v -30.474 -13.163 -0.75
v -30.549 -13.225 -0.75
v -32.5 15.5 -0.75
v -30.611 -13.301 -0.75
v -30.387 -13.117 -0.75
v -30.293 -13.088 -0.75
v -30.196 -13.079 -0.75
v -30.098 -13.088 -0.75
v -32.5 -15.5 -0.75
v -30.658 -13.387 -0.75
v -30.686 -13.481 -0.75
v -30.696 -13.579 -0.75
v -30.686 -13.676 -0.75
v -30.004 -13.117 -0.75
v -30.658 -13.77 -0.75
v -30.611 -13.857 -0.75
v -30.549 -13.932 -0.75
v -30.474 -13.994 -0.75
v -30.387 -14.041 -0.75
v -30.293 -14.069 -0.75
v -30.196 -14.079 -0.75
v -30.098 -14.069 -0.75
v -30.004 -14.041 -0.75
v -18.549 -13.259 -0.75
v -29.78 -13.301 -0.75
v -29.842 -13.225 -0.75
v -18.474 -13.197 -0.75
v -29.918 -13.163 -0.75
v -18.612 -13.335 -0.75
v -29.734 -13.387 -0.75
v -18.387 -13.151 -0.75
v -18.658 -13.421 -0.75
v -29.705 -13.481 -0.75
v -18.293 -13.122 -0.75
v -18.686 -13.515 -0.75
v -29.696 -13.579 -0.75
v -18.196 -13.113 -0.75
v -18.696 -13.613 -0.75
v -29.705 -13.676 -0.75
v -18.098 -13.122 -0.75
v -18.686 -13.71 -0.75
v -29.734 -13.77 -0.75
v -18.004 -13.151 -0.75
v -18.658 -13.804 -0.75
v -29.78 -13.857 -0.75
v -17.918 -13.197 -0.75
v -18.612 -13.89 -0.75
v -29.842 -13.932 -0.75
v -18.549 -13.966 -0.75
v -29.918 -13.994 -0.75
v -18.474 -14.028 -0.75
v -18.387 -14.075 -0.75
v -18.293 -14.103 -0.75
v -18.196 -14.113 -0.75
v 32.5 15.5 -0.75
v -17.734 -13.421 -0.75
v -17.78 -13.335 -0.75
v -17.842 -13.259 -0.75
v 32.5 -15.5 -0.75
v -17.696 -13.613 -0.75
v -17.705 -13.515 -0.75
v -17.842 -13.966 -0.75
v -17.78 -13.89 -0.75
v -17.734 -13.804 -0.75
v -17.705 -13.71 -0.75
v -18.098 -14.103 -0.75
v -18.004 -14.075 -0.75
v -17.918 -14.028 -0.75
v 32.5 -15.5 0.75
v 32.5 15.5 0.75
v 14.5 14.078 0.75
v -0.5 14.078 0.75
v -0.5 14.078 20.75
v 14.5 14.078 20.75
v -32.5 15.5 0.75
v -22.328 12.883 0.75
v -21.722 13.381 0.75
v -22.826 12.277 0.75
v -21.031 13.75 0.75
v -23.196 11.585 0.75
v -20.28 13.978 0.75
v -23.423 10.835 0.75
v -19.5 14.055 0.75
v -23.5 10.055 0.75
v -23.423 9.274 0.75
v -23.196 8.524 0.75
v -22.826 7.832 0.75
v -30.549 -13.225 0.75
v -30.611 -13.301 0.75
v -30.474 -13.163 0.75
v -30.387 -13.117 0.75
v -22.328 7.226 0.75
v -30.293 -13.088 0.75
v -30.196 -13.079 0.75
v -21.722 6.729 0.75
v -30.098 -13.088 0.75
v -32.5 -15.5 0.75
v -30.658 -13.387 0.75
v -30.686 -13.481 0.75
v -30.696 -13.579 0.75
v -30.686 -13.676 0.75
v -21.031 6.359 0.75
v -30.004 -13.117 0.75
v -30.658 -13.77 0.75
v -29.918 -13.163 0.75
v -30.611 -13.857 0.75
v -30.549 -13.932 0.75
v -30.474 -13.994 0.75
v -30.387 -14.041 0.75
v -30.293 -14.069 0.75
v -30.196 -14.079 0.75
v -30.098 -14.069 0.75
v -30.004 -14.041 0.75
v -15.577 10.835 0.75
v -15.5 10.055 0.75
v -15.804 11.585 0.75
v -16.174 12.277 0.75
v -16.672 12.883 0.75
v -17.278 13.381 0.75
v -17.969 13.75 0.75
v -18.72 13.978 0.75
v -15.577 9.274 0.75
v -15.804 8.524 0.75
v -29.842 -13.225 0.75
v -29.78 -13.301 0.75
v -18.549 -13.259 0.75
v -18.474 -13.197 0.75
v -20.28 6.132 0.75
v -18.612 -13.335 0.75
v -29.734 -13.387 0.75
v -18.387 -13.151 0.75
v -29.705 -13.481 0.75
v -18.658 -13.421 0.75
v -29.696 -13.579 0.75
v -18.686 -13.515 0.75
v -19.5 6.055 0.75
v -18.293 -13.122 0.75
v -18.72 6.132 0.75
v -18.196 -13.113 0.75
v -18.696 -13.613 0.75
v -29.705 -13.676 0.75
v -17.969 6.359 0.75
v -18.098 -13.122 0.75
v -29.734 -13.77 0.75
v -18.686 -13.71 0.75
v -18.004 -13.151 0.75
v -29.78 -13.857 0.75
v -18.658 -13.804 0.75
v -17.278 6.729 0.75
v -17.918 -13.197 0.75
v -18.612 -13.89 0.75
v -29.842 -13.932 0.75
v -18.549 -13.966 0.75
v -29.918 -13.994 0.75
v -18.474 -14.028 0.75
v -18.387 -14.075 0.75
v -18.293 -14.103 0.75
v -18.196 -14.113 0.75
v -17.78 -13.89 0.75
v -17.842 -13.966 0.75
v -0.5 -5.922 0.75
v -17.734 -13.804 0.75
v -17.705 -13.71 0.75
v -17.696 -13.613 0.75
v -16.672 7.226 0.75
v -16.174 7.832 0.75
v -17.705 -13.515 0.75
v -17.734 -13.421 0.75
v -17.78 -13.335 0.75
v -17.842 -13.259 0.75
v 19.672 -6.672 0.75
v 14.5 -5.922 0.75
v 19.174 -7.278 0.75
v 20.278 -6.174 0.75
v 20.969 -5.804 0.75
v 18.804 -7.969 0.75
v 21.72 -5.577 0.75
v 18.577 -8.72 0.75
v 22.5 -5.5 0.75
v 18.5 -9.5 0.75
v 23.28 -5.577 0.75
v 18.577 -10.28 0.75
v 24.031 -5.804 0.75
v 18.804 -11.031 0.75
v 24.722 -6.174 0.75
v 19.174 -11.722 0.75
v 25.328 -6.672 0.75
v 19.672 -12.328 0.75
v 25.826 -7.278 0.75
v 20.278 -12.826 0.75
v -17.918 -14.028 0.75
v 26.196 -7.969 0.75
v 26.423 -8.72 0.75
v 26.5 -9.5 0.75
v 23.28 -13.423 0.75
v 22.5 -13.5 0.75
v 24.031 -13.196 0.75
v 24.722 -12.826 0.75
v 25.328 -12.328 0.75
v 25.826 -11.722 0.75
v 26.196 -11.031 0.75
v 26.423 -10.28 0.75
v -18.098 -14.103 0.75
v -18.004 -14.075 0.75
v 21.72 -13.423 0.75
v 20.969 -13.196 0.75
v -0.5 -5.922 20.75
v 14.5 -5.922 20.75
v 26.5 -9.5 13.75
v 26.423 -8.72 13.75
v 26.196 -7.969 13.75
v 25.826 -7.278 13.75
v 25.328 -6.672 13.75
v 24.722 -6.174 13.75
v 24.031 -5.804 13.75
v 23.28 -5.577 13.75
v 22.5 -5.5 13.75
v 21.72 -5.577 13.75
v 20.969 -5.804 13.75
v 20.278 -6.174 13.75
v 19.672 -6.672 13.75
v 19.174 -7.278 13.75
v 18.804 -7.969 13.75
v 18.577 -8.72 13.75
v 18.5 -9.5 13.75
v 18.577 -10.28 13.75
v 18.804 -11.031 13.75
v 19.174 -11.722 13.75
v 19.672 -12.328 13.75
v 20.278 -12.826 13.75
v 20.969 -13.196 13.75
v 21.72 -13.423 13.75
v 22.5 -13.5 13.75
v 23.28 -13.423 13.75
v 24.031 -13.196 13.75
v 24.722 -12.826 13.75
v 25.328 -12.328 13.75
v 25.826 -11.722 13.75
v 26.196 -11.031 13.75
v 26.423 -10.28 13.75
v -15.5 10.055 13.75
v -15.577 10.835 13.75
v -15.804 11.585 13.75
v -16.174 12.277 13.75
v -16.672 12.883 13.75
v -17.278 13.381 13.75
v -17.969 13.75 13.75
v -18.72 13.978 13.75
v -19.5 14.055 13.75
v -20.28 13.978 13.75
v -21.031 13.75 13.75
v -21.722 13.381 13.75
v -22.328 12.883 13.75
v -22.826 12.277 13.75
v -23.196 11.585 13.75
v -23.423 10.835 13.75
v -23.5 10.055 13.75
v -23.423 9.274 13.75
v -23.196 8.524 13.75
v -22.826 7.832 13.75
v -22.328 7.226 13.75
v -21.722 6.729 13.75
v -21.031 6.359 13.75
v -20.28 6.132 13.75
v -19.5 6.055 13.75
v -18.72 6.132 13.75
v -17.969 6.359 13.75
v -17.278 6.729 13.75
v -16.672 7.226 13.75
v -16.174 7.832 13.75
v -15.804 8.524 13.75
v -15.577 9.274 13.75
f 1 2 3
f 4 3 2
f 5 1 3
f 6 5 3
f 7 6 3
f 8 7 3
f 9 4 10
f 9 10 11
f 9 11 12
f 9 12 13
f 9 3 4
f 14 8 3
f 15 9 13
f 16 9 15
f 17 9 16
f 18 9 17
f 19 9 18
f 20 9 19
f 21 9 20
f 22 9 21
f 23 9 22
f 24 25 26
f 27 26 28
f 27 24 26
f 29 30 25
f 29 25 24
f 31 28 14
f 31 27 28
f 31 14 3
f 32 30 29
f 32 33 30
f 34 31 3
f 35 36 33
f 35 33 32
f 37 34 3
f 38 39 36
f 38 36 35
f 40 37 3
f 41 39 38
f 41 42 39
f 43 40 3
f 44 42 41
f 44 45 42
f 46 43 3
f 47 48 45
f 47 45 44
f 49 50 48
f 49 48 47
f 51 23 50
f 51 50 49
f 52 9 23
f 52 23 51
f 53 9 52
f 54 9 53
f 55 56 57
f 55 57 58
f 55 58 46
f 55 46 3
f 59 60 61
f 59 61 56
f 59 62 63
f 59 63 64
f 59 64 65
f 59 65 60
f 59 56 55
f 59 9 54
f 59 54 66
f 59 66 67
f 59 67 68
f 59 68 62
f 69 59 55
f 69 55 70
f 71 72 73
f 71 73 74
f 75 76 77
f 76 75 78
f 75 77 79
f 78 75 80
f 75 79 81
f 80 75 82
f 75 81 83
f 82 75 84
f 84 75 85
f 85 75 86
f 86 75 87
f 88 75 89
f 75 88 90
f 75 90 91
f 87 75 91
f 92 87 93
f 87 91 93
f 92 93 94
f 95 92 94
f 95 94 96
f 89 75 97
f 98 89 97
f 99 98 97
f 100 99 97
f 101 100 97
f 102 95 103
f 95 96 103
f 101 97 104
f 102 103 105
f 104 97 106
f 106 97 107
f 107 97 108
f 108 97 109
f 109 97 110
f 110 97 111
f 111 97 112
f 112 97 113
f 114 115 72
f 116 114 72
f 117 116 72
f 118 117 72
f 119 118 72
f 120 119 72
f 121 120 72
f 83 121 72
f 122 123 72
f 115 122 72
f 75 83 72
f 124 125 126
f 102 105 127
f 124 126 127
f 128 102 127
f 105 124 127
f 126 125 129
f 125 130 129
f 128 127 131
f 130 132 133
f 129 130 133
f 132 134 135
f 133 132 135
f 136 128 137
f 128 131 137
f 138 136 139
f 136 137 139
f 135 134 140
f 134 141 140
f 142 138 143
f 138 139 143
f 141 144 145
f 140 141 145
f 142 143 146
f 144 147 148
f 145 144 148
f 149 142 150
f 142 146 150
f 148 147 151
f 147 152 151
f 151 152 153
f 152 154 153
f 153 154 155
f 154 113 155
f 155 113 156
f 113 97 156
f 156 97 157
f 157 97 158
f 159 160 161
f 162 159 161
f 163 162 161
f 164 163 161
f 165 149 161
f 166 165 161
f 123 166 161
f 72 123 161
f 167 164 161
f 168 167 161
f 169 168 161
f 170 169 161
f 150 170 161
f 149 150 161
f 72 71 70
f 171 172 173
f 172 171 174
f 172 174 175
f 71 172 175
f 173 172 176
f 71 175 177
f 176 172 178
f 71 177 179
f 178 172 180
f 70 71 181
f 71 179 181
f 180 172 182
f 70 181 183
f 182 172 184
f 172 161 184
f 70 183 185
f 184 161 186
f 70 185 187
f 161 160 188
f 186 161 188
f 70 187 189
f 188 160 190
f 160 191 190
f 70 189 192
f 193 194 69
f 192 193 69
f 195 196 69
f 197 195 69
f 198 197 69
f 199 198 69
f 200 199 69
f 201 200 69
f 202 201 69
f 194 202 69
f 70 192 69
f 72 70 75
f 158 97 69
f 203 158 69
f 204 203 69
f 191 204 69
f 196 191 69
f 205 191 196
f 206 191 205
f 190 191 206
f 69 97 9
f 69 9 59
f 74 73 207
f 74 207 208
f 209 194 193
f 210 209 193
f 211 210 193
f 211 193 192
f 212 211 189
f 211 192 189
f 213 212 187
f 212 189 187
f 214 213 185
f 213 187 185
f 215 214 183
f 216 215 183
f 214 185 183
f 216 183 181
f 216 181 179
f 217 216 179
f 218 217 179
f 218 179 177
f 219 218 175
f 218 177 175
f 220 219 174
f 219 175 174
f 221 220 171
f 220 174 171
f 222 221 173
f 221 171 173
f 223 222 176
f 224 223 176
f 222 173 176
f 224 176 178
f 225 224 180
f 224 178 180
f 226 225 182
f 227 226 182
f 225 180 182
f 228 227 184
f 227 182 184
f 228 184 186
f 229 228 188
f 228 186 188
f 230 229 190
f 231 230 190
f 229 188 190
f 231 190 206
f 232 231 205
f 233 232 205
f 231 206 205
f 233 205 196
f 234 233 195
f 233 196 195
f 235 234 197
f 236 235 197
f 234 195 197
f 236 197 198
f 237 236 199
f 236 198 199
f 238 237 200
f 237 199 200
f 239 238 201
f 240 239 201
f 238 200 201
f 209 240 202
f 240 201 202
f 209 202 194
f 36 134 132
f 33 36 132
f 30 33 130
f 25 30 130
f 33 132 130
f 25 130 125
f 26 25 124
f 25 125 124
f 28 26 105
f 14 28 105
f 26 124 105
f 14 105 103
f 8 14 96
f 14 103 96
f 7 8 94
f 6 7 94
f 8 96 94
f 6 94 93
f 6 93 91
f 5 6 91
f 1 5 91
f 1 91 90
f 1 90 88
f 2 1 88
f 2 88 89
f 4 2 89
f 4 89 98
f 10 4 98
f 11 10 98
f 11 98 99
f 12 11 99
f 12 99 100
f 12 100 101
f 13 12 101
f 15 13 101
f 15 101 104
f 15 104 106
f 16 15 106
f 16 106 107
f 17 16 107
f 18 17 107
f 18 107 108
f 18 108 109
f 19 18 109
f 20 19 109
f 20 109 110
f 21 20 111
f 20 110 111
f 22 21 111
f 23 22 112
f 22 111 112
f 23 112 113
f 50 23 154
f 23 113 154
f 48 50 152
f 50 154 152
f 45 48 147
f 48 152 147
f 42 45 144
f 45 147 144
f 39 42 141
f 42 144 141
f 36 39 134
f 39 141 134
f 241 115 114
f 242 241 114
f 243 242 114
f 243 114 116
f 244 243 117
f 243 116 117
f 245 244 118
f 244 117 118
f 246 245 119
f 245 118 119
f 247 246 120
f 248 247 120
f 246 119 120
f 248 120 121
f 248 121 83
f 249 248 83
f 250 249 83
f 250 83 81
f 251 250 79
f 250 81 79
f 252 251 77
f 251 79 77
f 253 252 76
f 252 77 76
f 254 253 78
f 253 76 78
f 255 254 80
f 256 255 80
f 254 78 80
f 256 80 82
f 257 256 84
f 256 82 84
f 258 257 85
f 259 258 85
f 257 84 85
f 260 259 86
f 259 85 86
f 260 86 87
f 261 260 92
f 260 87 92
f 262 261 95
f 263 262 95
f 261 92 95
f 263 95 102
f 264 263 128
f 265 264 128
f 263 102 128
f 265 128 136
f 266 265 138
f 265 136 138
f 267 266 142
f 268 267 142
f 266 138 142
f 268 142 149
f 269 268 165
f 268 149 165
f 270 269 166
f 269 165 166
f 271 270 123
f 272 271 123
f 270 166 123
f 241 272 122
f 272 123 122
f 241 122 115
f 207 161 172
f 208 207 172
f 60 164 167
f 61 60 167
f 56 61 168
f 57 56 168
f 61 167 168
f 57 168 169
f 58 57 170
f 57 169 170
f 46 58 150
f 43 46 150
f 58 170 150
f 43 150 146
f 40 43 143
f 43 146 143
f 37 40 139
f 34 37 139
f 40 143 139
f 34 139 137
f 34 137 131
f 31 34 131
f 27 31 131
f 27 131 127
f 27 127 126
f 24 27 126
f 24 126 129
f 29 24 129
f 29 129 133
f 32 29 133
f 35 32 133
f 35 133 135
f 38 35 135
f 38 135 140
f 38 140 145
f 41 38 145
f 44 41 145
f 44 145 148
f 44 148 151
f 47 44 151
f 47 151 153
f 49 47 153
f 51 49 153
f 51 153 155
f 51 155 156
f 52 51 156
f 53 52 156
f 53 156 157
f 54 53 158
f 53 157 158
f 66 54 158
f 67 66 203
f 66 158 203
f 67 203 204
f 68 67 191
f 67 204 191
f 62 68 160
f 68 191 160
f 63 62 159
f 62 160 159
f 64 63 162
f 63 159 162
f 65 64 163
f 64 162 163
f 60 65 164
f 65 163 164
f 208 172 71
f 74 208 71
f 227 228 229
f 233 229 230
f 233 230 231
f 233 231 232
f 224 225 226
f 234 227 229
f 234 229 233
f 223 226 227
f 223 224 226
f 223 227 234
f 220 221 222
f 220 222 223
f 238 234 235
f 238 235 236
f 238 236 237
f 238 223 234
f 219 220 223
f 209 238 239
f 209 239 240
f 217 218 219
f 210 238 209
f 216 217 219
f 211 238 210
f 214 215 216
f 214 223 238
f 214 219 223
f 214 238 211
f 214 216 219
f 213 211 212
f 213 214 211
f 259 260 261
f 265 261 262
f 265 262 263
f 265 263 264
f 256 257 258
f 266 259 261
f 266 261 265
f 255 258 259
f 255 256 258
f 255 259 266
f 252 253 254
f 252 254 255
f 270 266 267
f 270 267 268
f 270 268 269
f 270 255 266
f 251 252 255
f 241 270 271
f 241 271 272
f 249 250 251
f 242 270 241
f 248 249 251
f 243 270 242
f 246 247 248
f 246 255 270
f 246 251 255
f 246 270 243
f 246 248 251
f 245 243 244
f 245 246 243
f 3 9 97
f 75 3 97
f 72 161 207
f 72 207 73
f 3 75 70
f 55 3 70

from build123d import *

# Parameters (mm, degrees)
F0_W      = 65
F0_H      = 1.5
F1_DEPTH  = 15.5
F2_W      = 15
F2_H      = 20
F3_DEPTH  = 20
F4_R      = 4
F5_DEPTH  = 13
F6_R      = 4
F7_DEPTH  = 13
F8_R      = 0.5
F9_DEPTH  = 25.4
F10_R     = 0.5
F11_DEPTH = 25.4


with BuildPart() as f1:
    # F0 (on Front) → F1 (new body, symmetric)
    with BuildSketch(Plane.XZ):
        Rectangle(F0_W, F0_H)
    extrude(amount=F1_DEPTH, both=True)

    # F2 (on face) → F3 (join)
    with BuildSketch(Plane.XY.offset(0.75)):
        with Locations((7, 4.07752)):
            Rectangle(F2_W, F2_H)
    extrude(amount=F3_DEPTH)

    # F4 (on face) → F5 (join)
    with BuildSketch(Plane.XY.offset(0.75)):
        with Locations((-19.5, 10.054756)):
            Circle(F4_R)
    extrude(amount=F5_DEPTH)

    # F6 (on face) → F7 (join)
    with BuildSketch(Plane.XY.offset(0.75)):
        with Locations((22.5, -9.5)):
            Circle(F6_R)
    extrude(amount=F7_DEPTH)

    # F8 (on face) → F9 (cut)
    with BuildSketch(Plane.XY.offset(0.75)):
        with Locations((-30.195765, -13.578762)):
            Circle(F8_R)
    extrude(amount=-F9_DEPTH, mode=Mode.SUBTRACT)

    # F10 (on face) → F11 (cut)
    with BuildSketch(Plane.XY.offset(0.75)):
        with Locations((-18.195813, -13.612677)):
            Circle(F10_R)
    extrude(amount=-F11_DEPTH, mode=Mode.SUBTRACT)


solid = f1.part
